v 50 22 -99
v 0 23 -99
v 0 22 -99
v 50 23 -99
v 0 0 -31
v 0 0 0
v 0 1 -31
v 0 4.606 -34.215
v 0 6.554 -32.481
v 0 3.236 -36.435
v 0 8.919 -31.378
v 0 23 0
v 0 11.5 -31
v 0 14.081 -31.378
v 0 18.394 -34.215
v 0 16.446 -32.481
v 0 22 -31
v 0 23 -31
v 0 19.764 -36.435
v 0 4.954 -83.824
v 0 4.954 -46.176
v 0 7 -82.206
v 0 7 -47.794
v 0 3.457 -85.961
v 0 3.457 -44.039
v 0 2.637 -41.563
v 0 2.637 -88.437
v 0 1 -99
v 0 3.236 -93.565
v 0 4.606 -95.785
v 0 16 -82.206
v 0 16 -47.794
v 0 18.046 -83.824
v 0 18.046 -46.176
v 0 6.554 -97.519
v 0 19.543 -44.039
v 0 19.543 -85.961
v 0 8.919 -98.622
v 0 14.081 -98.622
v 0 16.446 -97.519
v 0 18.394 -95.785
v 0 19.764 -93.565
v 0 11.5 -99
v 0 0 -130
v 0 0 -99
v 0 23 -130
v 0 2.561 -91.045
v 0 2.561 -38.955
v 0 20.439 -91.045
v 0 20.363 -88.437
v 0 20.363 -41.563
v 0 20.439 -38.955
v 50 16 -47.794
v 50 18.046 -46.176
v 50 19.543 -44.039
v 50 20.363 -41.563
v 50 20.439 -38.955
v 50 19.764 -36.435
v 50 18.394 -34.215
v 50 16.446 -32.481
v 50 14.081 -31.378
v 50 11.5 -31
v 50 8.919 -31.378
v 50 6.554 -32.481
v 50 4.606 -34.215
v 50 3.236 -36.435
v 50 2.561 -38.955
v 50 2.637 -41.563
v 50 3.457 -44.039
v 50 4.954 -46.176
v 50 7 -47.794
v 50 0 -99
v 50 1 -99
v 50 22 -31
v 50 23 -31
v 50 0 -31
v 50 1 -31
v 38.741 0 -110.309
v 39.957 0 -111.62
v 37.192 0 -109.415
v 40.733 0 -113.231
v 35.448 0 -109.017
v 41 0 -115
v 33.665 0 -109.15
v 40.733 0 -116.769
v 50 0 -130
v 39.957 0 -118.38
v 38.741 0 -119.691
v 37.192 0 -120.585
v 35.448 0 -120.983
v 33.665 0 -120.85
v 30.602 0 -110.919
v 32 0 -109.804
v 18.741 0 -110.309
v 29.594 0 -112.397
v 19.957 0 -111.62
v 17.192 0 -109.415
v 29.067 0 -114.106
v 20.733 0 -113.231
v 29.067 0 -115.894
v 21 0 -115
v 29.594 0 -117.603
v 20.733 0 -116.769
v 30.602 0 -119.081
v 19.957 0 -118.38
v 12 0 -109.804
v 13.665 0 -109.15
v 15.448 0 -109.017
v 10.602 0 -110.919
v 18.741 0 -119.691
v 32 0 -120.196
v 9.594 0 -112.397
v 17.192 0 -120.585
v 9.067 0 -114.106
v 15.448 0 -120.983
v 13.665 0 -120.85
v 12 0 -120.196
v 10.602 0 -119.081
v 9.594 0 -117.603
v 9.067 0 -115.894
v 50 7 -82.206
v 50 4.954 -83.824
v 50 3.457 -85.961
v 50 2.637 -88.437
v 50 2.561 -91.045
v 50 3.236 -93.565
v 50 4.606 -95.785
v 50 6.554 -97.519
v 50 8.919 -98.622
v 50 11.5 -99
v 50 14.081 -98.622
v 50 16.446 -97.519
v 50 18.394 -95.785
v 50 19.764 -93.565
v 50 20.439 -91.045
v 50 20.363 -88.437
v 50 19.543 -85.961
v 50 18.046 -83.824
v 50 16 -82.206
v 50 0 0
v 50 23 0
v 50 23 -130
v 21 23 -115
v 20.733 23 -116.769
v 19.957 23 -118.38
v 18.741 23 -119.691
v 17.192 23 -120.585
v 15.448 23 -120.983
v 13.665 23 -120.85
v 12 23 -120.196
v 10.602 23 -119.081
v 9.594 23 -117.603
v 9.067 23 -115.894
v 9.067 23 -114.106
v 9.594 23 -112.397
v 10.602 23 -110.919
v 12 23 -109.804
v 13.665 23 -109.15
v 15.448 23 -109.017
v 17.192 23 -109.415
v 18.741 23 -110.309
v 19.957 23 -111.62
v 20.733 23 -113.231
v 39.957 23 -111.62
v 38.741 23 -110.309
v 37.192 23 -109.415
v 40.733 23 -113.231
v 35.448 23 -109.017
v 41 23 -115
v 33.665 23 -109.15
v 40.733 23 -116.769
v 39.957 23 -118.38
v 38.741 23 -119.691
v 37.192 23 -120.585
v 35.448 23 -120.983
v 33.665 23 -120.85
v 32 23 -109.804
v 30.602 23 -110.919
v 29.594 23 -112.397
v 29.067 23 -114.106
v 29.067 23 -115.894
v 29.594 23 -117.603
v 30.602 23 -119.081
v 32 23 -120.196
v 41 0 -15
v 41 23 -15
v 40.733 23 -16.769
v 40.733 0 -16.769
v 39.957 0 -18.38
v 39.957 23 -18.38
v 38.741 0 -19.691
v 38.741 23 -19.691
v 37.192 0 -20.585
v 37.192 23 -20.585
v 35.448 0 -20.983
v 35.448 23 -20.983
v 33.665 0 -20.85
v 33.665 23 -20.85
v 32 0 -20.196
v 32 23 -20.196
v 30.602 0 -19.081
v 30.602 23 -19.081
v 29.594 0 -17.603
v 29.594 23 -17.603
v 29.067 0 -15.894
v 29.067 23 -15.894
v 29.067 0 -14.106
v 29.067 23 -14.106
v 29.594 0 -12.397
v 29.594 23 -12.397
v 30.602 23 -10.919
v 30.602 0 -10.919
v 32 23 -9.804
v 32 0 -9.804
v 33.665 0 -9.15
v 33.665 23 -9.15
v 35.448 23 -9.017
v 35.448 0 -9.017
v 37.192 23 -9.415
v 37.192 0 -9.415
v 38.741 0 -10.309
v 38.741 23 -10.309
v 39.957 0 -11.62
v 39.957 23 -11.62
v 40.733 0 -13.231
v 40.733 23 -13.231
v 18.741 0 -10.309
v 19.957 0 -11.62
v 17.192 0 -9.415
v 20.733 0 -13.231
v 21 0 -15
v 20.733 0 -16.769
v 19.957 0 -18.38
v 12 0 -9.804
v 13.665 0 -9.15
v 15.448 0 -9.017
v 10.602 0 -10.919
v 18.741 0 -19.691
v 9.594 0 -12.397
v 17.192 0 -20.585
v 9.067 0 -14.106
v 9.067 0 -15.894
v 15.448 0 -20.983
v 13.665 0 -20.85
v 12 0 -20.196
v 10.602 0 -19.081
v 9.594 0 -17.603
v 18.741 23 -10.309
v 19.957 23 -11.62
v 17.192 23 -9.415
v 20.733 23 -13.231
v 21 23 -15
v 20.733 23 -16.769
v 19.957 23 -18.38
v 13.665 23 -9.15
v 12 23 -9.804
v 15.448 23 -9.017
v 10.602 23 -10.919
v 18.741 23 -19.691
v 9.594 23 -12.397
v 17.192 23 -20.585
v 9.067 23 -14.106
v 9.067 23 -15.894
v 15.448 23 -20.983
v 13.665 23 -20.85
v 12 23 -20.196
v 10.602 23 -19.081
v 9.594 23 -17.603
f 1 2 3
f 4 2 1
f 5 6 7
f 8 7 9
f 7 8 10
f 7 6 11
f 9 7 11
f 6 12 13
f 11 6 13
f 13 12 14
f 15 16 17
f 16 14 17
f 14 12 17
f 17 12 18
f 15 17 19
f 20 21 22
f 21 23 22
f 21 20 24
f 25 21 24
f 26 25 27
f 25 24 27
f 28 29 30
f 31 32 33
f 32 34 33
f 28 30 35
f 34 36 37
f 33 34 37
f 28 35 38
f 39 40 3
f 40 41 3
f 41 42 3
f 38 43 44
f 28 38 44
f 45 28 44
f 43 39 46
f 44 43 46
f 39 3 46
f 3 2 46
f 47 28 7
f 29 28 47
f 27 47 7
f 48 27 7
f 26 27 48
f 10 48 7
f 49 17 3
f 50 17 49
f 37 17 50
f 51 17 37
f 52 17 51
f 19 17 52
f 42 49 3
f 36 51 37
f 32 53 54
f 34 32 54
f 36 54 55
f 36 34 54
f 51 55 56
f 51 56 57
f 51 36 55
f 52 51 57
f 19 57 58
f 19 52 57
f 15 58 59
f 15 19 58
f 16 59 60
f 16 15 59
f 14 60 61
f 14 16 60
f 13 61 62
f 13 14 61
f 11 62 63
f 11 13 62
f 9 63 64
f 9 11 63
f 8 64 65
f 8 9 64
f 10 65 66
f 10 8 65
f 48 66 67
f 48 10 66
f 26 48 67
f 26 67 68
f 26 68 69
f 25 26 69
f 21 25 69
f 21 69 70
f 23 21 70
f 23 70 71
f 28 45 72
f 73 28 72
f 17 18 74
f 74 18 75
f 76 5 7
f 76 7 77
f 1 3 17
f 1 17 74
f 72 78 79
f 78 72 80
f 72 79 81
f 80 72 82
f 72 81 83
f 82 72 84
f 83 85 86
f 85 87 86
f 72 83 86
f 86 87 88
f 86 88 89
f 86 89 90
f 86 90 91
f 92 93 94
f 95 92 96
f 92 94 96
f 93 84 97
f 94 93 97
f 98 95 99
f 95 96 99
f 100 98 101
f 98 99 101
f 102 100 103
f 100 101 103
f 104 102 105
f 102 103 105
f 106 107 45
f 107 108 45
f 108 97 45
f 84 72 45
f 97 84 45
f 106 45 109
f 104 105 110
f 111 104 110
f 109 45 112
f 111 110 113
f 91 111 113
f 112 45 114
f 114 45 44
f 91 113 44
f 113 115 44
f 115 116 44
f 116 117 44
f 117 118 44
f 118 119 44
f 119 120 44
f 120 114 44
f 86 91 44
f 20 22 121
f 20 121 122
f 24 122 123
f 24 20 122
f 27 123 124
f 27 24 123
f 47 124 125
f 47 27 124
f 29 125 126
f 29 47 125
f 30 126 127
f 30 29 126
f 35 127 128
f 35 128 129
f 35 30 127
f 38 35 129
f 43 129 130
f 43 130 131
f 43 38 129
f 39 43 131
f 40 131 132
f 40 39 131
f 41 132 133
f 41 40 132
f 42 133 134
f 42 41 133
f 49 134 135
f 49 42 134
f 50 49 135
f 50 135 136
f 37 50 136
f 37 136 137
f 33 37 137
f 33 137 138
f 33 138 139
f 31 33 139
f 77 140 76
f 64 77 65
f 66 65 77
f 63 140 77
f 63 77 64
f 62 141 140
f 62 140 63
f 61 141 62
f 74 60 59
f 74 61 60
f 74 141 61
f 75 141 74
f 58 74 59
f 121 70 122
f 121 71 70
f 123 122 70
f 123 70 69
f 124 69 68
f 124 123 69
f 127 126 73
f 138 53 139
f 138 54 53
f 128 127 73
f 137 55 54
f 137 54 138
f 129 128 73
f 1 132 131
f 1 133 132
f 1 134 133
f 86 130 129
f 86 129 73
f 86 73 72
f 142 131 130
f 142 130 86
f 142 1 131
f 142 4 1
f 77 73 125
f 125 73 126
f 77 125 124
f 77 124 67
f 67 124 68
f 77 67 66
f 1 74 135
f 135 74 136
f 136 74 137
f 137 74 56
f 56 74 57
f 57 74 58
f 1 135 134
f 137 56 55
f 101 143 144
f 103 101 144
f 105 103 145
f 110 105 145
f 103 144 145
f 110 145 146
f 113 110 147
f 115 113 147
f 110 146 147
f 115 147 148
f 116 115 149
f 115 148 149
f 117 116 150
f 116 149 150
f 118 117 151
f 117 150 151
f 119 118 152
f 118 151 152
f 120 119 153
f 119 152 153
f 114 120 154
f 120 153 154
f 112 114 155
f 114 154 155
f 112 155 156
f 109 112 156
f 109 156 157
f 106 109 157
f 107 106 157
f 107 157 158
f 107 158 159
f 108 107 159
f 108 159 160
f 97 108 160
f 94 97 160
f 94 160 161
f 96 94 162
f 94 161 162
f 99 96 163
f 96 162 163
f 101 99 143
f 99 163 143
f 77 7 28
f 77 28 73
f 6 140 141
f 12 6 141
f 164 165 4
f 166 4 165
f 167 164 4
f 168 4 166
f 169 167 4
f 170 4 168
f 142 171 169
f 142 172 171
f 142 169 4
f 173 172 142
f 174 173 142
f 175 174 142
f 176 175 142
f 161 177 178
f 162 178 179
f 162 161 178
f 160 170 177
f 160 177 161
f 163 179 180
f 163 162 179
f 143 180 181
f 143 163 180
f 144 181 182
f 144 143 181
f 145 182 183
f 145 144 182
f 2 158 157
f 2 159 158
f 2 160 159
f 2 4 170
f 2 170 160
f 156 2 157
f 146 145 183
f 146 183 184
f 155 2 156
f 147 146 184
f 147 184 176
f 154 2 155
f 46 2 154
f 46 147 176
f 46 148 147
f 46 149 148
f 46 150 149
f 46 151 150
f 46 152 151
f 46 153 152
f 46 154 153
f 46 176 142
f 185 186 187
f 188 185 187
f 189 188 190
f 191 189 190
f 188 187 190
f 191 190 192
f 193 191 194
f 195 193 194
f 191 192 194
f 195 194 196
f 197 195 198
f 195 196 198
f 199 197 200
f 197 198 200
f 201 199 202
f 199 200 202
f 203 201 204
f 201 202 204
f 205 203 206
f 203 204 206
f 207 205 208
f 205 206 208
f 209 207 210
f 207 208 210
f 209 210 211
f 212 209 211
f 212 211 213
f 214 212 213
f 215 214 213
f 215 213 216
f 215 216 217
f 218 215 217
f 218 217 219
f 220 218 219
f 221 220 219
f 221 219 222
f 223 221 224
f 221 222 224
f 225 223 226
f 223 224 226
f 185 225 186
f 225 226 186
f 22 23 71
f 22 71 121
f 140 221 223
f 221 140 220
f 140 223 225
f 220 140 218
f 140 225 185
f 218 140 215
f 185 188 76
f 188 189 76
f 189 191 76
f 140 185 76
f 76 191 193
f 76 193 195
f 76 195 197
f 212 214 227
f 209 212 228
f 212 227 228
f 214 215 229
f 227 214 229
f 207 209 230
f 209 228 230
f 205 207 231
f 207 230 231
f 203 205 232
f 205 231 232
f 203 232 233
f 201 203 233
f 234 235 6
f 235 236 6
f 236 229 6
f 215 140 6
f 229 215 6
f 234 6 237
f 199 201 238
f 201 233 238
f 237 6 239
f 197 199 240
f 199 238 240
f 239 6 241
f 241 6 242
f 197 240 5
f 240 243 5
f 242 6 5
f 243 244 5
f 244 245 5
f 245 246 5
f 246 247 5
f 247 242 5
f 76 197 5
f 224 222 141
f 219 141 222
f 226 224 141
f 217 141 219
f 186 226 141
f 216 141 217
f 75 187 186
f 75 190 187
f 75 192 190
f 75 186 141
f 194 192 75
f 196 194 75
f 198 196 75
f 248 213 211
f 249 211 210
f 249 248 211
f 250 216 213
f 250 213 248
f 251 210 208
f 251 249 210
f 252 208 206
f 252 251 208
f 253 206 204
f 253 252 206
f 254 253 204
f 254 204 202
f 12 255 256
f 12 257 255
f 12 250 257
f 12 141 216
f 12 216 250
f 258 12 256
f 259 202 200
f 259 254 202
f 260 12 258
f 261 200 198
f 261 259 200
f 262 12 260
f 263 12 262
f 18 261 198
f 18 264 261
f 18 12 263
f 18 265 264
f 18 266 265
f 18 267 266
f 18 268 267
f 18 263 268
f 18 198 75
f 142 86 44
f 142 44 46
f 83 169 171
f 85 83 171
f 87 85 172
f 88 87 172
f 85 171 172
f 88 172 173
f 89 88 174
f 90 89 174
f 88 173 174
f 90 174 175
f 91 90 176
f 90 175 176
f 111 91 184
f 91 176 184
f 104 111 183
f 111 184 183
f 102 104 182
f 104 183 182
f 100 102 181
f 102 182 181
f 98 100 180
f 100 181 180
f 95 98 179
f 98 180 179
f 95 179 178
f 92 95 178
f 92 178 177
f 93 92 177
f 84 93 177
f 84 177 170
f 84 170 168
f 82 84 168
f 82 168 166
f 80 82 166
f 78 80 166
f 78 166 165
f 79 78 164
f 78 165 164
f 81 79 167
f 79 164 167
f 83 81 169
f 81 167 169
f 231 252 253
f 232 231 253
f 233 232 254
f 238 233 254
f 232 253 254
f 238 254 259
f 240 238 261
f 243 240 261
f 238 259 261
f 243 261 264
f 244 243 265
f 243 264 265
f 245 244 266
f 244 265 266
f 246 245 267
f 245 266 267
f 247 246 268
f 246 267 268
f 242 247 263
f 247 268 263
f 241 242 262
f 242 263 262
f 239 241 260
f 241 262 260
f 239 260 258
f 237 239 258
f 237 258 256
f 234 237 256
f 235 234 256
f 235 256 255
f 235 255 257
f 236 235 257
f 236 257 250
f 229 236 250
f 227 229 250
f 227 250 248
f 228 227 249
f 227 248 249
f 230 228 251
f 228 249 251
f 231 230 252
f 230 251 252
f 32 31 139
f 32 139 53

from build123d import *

# Parameters (mm, degrees)
SKETCH2_W           = 130
SKETCH2_H           = 23
BOSS_EXTRUDE1_DEPTH = 50
SKETCH3_R           = 6
CUT_EXTRUDE1_DEPTH  = 23
SKETCH4_W           = 50
SKETCH4_H           = 68
CUT_EXTRUDE3_DEPTH  = 1
SKETCH5_W           = 50
SKETCH5_H           = 68
CUT_EXTRUDE4_DEPTH  = 1


with BuildPart() as part:
    # Sketch2 → Boss-Extrude1 (new body)
    with BuildSketch(Plane(origin=(0, 0, 0), x_dir=(0, 0, -1), z_dir=(1, 0, 0))):
        with Locations((65, 11.5)):
            Rectangle(SKETCH2_W, SKETCH2_H)
        with BuildLine():
            Line((82.205771366, 16), (47.794228634, 16))
            ThreePointArc((47.794228634, 16), (31, 11.5), (47.794228634, 7))
            Line((47.794228634, 7), (82.205771366, 7))
            ThreePointArc((82.205771366, 7), (99, 11.5), (82.205771366, 16))
        make_face(mode=Mode.SUBTRACT)
    extrude(amount=BOSS_EXTRUDE1_DEPTH)

    # Sketch3 → Cut-Extrude1 (cut)
    with BuildSketch(Plane(origin=(0, 23, 0), x_dir=(1, 0, 0), z_dir=(0, 1, 0))):
        with Locations((15, 15)):
            Circle(SKETCH3_R)
        with Locations((35, 15)):
            Circle(SKETCH3_R)
        with Locations((15, 115)):
            Circle(SKETCH3_R)
        with Locations((35, 115)):
            Circle(SKETCH3_R)
    extrude(amount=-CUT_EXTRUDE1_DEPTH, mode=Mode.SUBTRACT)

    # Sketch4 → Cut-Extrude3 (cut)
    with BuildSketch(Plane(origin=(0, 23, 0), x_dir=(1, 0, 0), z_dir=(0, 1, 0))):
        with Locations((25, 65)):
            Rectangle(SKETCH4_W, SKETCH4_H)
    extrude(amount=-CUT_EXTRUDE3_DEPTH, mode=Mode.SUBTRACT)

    # Sketch5 → Cut-Extrude4 (cut)
    with BuildSketch(Plane.XZ):
        with Locations((25, -65)):
            Rectangle(SKETCH5_W, SKETCH5_H)
    extrude(amount=-CUT_EXTRUDE4_DEPTH, mode=Mode.SUBTRACT)


solid = part.part
